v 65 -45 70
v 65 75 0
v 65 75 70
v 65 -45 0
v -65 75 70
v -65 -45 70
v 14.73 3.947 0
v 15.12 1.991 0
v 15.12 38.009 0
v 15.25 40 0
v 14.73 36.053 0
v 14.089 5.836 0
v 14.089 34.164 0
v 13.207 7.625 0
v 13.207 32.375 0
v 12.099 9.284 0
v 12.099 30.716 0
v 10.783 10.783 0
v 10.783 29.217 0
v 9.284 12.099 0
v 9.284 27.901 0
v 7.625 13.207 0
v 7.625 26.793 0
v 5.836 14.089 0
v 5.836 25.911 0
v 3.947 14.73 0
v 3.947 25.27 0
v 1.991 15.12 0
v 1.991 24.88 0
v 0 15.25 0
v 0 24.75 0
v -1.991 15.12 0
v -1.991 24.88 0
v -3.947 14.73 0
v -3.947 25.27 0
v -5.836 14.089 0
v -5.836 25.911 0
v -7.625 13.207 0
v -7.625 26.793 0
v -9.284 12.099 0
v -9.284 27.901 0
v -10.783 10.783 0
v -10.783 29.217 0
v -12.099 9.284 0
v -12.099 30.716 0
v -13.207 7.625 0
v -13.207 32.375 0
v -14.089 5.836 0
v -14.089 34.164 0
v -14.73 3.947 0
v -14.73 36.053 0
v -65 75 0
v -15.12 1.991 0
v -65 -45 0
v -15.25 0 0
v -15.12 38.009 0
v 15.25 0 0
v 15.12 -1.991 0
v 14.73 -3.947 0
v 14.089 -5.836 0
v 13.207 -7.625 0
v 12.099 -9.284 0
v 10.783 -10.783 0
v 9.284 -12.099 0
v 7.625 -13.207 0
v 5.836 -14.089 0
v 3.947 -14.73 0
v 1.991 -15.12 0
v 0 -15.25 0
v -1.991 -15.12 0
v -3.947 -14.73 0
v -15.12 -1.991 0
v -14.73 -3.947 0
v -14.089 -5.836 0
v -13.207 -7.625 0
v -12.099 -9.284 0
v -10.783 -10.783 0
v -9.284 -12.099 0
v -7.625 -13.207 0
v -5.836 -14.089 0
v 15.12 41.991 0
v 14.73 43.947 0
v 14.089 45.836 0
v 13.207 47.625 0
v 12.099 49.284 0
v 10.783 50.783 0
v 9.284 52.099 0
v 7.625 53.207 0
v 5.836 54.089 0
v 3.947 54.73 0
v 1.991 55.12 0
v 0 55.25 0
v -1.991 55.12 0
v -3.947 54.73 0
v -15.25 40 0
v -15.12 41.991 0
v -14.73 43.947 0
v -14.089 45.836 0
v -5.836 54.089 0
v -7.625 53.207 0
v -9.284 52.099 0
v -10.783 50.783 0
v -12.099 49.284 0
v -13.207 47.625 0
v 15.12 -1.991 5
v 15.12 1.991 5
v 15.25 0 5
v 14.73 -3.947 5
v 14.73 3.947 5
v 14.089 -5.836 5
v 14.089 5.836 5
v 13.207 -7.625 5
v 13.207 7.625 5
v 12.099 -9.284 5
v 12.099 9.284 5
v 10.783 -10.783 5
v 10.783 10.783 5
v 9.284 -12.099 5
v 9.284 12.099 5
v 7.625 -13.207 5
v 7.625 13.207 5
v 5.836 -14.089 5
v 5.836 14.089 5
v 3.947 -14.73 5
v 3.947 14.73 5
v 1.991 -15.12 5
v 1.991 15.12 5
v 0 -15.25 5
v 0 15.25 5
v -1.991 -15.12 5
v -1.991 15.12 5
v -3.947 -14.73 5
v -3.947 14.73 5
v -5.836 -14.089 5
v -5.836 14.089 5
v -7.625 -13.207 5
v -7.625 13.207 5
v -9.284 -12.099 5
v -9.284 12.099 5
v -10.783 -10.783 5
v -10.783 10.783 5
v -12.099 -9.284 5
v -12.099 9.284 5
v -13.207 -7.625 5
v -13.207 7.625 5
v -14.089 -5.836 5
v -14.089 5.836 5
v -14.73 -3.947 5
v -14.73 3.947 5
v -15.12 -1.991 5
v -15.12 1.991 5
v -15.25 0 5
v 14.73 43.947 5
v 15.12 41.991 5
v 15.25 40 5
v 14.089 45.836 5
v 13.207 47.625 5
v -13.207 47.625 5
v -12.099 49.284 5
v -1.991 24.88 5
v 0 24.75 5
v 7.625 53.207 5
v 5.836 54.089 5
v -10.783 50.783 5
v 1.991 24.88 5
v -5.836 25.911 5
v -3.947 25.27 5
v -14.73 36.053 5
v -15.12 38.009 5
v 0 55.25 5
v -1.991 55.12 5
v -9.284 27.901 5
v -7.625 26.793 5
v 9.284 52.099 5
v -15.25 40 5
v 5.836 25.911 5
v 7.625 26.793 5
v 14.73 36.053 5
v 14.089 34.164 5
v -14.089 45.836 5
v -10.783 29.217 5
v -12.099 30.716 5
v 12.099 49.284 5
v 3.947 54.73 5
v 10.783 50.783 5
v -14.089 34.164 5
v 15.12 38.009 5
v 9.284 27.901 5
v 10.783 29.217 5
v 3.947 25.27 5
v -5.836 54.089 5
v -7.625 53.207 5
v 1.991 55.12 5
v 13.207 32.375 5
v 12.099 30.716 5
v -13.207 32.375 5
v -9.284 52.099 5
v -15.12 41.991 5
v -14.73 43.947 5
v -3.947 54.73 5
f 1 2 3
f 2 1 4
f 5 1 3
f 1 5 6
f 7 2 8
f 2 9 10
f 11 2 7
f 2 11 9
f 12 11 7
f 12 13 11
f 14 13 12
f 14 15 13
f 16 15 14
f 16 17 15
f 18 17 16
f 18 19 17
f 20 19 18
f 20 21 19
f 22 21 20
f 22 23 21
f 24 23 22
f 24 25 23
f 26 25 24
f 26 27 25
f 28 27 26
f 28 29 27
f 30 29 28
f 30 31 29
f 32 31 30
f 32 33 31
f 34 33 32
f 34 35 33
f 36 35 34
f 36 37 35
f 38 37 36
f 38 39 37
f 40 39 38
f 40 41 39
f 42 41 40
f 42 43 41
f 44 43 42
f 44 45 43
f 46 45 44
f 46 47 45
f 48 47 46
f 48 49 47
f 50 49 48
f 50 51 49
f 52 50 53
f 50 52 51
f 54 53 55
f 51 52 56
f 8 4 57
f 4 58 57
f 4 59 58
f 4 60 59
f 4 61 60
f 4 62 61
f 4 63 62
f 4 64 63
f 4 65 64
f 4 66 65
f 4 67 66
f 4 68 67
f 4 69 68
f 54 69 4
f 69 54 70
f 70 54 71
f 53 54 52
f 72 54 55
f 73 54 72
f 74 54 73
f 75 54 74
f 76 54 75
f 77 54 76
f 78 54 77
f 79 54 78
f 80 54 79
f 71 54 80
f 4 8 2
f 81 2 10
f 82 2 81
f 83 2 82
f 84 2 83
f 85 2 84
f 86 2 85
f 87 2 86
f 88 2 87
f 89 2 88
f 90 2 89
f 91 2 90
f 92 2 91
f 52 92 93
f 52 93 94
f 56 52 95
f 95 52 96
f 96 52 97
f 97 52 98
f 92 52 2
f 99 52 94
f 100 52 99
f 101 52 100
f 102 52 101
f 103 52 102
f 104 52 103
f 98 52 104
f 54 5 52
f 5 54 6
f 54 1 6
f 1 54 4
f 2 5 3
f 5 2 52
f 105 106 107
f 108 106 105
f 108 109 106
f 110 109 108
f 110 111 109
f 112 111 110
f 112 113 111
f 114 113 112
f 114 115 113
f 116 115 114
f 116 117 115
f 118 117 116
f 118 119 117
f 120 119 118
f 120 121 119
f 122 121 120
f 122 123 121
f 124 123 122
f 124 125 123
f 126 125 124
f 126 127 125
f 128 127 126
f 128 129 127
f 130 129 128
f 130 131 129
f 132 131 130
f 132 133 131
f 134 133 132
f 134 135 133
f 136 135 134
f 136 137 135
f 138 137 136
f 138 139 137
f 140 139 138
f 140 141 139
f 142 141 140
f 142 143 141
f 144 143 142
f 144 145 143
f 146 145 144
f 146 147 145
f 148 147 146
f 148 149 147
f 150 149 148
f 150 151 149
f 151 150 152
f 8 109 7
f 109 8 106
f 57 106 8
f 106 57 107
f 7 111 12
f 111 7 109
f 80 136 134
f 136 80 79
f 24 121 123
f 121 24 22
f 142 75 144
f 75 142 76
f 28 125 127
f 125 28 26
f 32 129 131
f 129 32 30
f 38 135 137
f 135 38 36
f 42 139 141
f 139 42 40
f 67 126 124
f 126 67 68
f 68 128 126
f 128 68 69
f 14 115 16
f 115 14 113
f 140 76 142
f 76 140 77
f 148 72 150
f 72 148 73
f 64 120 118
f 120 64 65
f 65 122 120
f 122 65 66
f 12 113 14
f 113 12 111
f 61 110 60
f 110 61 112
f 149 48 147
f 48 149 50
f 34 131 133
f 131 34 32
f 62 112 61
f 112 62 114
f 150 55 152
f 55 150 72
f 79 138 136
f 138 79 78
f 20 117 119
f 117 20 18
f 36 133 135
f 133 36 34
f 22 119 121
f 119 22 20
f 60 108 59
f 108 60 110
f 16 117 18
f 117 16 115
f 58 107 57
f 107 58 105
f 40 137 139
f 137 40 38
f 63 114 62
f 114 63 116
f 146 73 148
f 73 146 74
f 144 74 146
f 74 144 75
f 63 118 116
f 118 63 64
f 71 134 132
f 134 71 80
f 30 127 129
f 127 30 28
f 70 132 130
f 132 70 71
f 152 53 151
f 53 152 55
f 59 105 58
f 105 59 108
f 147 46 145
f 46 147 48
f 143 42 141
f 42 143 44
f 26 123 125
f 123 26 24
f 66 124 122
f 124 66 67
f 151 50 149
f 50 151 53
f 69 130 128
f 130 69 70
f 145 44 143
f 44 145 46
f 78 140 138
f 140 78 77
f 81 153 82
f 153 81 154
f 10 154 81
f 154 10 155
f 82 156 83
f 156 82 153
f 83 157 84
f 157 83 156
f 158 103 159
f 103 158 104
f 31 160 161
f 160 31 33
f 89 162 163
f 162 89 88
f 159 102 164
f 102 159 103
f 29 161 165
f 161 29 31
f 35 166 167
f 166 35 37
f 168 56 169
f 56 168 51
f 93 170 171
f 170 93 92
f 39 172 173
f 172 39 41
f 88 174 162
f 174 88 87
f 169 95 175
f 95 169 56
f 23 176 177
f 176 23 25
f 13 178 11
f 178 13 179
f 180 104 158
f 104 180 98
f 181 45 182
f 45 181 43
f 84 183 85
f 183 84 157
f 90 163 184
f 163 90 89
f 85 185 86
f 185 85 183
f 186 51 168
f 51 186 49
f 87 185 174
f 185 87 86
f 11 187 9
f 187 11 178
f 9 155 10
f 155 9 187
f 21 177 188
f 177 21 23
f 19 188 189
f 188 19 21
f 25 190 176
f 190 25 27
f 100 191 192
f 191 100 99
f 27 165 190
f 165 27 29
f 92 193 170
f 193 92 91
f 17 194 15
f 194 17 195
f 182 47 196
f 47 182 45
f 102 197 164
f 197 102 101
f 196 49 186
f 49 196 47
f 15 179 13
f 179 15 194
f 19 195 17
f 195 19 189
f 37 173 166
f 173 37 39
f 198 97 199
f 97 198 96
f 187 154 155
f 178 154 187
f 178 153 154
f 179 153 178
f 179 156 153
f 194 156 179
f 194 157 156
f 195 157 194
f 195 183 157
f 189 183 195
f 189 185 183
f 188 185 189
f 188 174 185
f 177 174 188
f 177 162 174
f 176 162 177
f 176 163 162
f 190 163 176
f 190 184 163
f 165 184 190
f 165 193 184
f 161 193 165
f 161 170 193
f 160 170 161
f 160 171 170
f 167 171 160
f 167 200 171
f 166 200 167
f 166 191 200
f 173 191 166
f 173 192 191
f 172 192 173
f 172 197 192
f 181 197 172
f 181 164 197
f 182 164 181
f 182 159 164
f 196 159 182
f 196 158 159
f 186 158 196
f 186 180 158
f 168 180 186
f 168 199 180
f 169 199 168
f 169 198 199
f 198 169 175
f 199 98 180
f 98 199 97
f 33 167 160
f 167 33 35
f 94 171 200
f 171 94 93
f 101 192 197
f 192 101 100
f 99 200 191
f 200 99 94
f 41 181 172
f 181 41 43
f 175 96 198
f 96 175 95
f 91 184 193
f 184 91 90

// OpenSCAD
// Tube rack for six 50 mL conical (Falcon-type) tubes - printed upside down and flipped over.
// A flat plate with a 2x3 hole grid and two solid side walls. The walls become the feet when
// the part is flipped, so the rack stands on a flat surface. The two short ends are open.
//

cols   = 3;
rows   = 2;
tube_d = 30.5;
pitch_x = 40;
pitch_y = 40;
plate_w = 130;
plate_h = 90;
plate_t = 4;
wall_h = 70;

$fn = 48;

plate_n = cols * rows;

difference() {
    union() {
        translate([-plate_w / 2, -plate_h / 2, 0]) cube([plate_w, plate_h, plate_t]);
        for (i = [0 : cols - 1])
            translate([-plate_w / 2, -plate_h / 2 + i * pitch_y, 0]) cube([plate_w, pitch_y, wall_h]);
    }
    for (i = [0 : cols - 1], j = [0 : rows - 1])
        translate([0, j * pitch_y, -1])
            cylinder(h = plate_t + 2, d = tube_d);
}
